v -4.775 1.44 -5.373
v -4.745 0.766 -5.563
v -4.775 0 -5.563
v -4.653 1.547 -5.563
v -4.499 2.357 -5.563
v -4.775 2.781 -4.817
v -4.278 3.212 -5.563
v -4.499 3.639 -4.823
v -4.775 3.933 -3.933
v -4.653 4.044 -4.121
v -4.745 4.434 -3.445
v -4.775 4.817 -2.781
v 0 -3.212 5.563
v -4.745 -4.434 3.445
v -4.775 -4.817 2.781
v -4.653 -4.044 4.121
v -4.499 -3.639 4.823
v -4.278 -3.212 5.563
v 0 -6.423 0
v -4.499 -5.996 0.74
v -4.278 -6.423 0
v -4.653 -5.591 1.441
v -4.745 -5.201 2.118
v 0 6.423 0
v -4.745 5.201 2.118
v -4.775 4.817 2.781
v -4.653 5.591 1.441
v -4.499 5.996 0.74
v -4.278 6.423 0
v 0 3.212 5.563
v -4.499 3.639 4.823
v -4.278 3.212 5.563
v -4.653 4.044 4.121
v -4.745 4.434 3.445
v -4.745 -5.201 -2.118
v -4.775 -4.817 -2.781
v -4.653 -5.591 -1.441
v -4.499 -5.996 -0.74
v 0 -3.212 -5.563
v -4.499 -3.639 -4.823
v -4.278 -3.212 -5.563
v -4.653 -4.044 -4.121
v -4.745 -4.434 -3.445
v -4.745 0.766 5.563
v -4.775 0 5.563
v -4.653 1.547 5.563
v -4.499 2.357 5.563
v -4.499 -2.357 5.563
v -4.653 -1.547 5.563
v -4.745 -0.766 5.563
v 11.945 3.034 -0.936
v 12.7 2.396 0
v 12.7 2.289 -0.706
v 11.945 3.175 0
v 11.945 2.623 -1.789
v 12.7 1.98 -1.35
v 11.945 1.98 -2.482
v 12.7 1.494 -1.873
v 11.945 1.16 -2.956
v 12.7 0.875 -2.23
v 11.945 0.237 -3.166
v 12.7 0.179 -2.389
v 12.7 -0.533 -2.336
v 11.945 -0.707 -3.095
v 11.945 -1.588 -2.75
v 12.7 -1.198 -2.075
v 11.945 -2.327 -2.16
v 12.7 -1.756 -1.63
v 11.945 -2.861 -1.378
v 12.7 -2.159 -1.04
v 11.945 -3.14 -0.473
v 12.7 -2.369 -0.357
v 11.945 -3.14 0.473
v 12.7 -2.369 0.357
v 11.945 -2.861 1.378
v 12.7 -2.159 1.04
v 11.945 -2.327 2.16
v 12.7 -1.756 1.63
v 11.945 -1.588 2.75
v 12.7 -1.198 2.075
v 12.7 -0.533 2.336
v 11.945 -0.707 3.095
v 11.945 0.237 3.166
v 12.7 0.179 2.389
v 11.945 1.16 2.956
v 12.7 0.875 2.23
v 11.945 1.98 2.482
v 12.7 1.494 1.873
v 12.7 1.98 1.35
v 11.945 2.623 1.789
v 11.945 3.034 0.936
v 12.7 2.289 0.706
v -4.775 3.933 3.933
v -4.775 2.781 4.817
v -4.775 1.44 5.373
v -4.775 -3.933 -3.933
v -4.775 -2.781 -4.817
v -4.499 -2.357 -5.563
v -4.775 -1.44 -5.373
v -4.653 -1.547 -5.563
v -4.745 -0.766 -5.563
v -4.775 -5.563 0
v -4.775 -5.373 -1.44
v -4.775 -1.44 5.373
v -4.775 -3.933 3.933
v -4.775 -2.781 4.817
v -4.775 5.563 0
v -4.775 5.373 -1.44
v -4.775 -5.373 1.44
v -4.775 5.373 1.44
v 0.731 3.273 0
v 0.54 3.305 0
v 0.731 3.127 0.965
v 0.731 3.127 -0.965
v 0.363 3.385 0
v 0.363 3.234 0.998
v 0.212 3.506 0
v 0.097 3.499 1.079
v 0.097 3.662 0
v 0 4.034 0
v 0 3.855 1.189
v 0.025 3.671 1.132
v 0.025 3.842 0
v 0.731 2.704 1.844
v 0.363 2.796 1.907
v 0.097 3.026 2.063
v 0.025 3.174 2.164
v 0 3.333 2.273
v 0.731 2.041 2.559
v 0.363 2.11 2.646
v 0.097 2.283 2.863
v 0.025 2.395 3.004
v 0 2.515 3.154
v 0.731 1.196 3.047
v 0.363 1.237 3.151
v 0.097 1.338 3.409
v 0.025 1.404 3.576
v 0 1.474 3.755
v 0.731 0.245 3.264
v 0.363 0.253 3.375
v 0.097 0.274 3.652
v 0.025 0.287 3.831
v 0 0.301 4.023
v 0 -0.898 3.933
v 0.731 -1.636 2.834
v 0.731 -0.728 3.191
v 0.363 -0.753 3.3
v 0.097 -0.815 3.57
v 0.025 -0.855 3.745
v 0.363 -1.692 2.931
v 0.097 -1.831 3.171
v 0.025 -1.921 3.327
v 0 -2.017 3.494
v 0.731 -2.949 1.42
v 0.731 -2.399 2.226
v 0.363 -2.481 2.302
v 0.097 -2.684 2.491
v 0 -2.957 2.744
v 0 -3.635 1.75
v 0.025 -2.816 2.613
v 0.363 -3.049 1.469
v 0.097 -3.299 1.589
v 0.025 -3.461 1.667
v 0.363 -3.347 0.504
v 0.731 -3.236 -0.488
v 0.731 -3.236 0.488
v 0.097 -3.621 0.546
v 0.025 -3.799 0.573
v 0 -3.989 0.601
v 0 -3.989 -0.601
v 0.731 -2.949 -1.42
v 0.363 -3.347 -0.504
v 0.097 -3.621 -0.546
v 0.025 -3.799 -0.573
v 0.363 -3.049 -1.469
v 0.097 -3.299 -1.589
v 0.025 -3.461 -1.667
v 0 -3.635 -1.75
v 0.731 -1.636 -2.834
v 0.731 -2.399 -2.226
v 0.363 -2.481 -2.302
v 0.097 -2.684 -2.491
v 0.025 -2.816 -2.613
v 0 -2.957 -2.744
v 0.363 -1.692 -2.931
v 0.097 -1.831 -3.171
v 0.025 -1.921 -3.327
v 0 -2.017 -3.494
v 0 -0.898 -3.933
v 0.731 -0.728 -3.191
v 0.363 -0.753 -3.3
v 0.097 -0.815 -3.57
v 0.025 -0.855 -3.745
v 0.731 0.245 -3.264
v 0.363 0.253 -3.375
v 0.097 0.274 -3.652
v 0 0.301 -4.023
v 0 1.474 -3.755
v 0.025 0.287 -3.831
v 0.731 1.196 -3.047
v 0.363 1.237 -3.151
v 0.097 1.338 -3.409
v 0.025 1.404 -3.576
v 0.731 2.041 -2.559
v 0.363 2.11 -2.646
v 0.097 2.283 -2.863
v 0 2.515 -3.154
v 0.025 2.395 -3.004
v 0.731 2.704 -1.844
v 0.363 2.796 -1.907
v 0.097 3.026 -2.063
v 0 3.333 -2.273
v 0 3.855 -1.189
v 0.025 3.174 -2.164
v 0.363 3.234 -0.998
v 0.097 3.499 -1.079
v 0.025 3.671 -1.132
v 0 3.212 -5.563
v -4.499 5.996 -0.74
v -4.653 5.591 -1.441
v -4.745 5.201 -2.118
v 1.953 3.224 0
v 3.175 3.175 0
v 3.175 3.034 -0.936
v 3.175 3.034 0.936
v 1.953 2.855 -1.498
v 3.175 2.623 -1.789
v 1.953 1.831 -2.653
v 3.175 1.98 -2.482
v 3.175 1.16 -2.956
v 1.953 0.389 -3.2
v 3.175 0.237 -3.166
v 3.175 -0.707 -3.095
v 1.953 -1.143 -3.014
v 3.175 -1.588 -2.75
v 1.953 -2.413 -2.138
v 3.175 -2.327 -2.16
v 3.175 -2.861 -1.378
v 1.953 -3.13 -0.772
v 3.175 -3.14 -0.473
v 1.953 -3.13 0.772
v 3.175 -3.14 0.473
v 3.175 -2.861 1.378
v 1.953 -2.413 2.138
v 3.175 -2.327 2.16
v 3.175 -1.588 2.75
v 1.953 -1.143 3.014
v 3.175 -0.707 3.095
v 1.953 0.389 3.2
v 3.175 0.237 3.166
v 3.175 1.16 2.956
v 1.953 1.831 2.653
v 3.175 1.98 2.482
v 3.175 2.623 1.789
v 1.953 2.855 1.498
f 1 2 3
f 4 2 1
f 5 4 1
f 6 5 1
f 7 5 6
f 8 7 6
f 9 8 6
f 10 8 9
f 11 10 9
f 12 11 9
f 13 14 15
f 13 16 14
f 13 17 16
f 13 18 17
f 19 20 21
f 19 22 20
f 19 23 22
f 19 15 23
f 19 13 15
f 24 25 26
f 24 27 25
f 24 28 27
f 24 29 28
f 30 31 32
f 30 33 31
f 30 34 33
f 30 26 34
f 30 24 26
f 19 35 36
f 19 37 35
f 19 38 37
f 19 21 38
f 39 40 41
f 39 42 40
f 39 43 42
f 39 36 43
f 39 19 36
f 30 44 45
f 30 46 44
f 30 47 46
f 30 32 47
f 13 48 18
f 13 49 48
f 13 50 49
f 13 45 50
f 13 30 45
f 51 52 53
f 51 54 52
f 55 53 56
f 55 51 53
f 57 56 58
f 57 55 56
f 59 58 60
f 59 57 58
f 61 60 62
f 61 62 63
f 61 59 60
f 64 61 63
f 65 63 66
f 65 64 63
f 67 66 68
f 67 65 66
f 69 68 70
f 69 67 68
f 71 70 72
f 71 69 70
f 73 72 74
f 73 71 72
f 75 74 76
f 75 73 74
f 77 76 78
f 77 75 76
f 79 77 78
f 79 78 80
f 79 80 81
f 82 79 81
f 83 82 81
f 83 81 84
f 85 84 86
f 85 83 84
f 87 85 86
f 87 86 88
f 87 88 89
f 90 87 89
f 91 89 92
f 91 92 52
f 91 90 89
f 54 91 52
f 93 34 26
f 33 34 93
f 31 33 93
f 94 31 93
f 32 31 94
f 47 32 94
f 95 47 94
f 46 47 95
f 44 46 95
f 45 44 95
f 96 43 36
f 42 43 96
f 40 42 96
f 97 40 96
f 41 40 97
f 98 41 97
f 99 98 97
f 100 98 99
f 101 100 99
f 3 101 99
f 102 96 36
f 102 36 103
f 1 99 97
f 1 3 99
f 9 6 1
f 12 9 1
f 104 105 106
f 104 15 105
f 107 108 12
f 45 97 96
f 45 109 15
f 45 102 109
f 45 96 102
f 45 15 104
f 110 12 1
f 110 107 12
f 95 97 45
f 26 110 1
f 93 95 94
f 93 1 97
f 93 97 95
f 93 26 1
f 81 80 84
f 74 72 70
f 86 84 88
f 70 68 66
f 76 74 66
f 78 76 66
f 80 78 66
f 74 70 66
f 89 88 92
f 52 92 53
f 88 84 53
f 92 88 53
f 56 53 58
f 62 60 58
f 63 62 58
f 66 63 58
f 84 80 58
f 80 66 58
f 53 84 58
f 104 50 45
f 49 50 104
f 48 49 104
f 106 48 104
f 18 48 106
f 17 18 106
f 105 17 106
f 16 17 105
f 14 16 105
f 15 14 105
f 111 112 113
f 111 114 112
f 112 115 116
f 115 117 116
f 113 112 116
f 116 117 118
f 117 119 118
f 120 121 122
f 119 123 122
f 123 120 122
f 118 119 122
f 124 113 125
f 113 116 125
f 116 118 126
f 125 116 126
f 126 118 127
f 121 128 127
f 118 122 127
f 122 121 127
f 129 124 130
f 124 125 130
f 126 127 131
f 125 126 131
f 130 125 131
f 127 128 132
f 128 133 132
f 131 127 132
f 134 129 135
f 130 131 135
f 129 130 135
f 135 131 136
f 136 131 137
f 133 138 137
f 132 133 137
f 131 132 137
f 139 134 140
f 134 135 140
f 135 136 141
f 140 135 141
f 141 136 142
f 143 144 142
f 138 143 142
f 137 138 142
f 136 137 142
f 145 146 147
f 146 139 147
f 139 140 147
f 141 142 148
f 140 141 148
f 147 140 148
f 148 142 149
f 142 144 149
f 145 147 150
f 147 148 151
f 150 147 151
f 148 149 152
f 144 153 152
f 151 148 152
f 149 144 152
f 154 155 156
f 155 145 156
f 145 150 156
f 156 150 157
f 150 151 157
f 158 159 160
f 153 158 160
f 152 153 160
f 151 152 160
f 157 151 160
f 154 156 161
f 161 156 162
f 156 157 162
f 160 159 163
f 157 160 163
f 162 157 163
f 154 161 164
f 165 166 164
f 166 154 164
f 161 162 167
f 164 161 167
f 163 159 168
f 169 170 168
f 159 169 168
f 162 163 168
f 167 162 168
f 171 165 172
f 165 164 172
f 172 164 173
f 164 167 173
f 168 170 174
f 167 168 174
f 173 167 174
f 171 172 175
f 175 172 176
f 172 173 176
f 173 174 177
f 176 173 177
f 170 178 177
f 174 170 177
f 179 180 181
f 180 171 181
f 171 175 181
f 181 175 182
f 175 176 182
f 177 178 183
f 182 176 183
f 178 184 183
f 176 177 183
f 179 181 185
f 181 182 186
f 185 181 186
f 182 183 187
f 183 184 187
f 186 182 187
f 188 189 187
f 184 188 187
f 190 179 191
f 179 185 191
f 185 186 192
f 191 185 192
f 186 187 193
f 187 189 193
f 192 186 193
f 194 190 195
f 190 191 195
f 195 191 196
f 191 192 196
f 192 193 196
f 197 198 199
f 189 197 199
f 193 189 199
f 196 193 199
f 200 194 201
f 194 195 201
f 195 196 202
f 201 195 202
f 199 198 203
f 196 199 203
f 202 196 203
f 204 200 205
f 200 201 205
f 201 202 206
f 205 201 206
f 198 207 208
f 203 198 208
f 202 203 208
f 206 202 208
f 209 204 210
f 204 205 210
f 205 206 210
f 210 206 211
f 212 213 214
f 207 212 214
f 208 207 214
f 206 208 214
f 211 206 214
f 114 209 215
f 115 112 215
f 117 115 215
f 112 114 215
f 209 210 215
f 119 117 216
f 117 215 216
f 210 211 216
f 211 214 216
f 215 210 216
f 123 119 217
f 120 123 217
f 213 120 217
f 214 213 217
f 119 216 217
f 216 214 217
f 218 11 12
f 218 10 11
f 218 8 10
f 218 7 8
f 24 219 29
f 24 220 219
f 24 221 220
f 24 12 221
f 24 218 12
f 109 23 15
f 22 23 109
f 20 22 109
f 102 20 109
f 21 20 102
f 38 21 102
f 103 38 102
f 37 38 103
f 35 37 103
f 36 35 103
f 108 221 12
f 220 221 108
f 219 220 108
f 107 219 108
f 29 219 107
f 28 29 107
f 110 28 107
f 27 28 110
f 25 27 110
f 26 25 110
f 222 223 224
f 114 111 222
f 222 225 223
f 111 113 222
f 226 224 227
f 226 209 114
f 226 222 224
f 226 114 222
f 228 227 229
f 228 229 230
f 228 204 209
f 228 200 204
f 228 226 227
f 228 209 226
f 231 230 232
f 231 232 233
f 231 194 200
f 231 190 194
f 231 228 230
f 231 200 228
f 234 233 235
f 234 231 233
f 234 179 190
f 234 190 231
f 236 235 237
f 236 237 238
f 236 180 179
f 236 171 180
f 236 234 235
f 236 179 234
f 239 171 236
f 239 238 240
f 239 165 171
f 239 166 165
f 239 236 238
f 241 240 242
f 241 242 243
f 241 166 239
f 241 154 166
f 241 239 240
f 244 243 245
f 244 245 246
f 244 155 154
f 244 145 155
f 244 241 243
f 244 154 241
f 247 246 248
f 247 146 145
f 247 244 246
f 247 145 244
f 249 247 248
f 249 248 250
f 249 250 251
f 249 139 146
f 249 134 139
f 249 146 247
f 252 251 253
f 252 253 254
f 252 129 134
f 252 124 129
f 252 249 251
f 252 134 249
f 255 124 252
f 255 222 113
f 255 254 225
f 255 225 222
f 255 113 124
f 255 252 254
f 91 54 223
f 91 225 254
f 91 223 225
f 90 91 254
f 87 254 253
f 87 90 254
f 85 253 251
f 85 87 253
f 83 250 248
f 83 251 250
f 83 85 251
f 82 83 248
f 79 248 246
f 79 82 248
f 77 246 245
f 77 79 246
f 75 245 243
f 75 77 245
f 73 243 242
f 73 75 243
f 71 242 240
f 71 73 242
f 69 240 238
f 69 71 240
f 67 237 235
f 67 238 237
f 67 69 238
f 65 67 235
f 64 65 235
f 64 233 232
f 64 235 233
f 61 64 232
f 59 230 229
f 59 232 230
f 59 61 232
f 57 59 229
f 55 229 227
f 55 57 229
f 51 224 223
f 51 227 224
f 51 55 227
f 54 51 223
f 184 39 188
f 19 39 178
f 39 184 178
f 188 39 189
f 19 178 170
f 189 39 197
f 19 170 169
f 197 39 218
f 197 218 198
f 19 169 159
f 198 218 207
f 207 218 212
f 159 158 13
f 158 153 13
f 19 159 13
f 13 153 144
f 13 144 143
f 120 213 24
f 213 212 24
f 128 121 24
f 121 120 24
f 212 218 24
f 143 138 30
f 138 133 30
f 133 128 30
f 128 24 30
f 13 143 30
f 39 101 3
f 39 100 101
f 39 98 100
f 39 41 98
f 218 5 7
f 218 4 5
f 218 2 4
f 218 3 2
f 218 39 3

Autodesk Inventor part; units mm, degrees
ref_plane "YZ Plane" through (0, 0, 0) normal (1, 0, 0) x (0, 1, 0)
ref_plane "XZ Plane" through (0, 0, 0) normal (0, 1, 0) x (-1, 0, 0)
sketch "Sketch1" plane through (0, 0, 0) normal (0, 0, 1) x (1, 0, 0)
  line L0 (0, 5.5626) -> (0, 3.302)
  line L1 (3.175, 3.175) -> (12.7, 3.175)
  line L2 (12.7, 3.175) -> (12.7, 0)
  line L3 (12.7, 0) -> (-0.0001, 0)
  line L4 (-2.5401, 0) -> (15.24, 0) projected
  line L5 (-0.0001, 0) -> (-0.0001, 5.5626)
  line L6 (-0.0001, 5.5626) -> (0, 5.5626)
  line L7 (3.175, 3.175) -> (0.0019, 3.302)
  line L8 (0.0019, 3.302) -> (0, 3.302)
  line L9 (0, -1.1125) -> (0, 6.6751) projected
  dimension "d0" = 12.7
  dimension "d1" = 9.525
  dimension "d2" = 6.35
  dimension "d9" = 0.0001
  dimension "d10" = 11.1252
  dimension "d13" = 3.1731
  dimension "d14" = 6.604
revolve "Body" add sketch "Sketch1" angle 360 about axis through (12.7, 0, 0) along (-1, 0, 0)
sketch "Sketch2" plane through (-0.0001, 0, 0) normal (-1, 0, 0) x (0, 0, 1)
  line L0 (0, 6.4231) -> (5.5626, 3.2116)
  line L1 (5.5626, 3.2116) -> (5.5626, -3.2116)
  line L2 (5.5626, -3.2116) -> (0, -6.4231)
  line L3 (0, -6.4231) -> (-5.5626, -3.2116)
  line L4 (-5.5626, -3.2116) -> (-5.5626, 3.2116)
  line L5 (-5.5626, 3.2116) -> (0, 6.4231)
  point P0 (0, 0)
  point P1 (0, 0)
  dimension "d11" = 11.1252
extrude "Head" add sketch "Sketch2" along normal blind 4.7752
sketch "Sketch4" plane through (0, 0, 0) normal (0, 0, 1) x (1, 0, 0)
  line L0 (-4.7753, 5.5626) -> (-4.7753, 6.4231)
  line L1 (-4.7753, 6.4231) -> (-4.2785, 6.4231)
  line L2 (-4.2785, 6.4231) -> (-4.7753, 5.5626)
  line L3 (-5.7303, 0) -> (0.9549, 0) projected
  line L4 (-0.0001, 6.4231) -> (-4.7753, 6.4231) projected
  line L5 (-4.7753, 3.2116) -> (-4.7753, 6.4231) projected
  dimension "d5" = 30
  dimension "d19" = 11.1252
revolve "Chamfer1" cut sketch "Sketch4" angle 360 about axis through (-10, 0, 0) along (1, 0, 0)
thread "Thread" size "1/4-20 UNC" class "2A" standard "ANSI Unified Screw Threads" length 9.525
chamfer "Chamfer2" distance 0.7791 distance2 0.7553 1 edges at (12.7, -3.175, 0) measured on face at (12.7, 1.0276, -1.1503)
ref_plane "Work Plane1" through (1.525, 0, 0) normal (0, 0, 1) x (1, 0, 0)
fillet "Fillet2" radius 0.762 1 edges at (0.0019, -3.302, 0)
equation "\"d0\" = NLG"
equation "\"d1\" = GEL"
equation "\"d2\" = GD"
equation "\"d10\" = SD2"
equation "\"d14\" = BDM"
equation "\"d11\" = SW"
equation "\"d3\" = KOH - SD"
equation "\"d5\" = ANG1"
equation "\"d19\" = SW0"
equation "\"d63\" = R"
equation "\"d15\" = GEL"
equation "\"d6\" = -0.5 * SPD + 0.5 * GD"
equation "\"NLG\" = 12.7"
equation "\"GD\" = NND"
equation "\"BDM\" = 6.604"
equation "\"KOH\" = 4.7752"
equation "\"GEL\" = 9.525"
equation "\"SW\" = 11.1252"
equation "\"SW0\" = SW"
equation "\"SPD\" = GD1"
equation "\"SD2\" = SW"
equation "\"SD\" = 0"
equation "\"ANG1\" = 30deg"
equation "\"GAL\" = 3.173"
equation "\"GUL\" = 0.238 * GAL"
equation "\"R\" = 0.762"
equation "\"d62\" = -NLG - SD + GUL"
equation "\"GD1\" = 4.79184"
equation "\"THREADDIA\" = 6.35"
equation "\"TOA\" = 30deg"
equation "\"NND\" = 6.35"
equation "\"E0\" = 1.155 * SW"
properties part number "ANSI/ASME B18.2.1 - 1/4-20 UNC - 0.5" material "Steel, Mild"
